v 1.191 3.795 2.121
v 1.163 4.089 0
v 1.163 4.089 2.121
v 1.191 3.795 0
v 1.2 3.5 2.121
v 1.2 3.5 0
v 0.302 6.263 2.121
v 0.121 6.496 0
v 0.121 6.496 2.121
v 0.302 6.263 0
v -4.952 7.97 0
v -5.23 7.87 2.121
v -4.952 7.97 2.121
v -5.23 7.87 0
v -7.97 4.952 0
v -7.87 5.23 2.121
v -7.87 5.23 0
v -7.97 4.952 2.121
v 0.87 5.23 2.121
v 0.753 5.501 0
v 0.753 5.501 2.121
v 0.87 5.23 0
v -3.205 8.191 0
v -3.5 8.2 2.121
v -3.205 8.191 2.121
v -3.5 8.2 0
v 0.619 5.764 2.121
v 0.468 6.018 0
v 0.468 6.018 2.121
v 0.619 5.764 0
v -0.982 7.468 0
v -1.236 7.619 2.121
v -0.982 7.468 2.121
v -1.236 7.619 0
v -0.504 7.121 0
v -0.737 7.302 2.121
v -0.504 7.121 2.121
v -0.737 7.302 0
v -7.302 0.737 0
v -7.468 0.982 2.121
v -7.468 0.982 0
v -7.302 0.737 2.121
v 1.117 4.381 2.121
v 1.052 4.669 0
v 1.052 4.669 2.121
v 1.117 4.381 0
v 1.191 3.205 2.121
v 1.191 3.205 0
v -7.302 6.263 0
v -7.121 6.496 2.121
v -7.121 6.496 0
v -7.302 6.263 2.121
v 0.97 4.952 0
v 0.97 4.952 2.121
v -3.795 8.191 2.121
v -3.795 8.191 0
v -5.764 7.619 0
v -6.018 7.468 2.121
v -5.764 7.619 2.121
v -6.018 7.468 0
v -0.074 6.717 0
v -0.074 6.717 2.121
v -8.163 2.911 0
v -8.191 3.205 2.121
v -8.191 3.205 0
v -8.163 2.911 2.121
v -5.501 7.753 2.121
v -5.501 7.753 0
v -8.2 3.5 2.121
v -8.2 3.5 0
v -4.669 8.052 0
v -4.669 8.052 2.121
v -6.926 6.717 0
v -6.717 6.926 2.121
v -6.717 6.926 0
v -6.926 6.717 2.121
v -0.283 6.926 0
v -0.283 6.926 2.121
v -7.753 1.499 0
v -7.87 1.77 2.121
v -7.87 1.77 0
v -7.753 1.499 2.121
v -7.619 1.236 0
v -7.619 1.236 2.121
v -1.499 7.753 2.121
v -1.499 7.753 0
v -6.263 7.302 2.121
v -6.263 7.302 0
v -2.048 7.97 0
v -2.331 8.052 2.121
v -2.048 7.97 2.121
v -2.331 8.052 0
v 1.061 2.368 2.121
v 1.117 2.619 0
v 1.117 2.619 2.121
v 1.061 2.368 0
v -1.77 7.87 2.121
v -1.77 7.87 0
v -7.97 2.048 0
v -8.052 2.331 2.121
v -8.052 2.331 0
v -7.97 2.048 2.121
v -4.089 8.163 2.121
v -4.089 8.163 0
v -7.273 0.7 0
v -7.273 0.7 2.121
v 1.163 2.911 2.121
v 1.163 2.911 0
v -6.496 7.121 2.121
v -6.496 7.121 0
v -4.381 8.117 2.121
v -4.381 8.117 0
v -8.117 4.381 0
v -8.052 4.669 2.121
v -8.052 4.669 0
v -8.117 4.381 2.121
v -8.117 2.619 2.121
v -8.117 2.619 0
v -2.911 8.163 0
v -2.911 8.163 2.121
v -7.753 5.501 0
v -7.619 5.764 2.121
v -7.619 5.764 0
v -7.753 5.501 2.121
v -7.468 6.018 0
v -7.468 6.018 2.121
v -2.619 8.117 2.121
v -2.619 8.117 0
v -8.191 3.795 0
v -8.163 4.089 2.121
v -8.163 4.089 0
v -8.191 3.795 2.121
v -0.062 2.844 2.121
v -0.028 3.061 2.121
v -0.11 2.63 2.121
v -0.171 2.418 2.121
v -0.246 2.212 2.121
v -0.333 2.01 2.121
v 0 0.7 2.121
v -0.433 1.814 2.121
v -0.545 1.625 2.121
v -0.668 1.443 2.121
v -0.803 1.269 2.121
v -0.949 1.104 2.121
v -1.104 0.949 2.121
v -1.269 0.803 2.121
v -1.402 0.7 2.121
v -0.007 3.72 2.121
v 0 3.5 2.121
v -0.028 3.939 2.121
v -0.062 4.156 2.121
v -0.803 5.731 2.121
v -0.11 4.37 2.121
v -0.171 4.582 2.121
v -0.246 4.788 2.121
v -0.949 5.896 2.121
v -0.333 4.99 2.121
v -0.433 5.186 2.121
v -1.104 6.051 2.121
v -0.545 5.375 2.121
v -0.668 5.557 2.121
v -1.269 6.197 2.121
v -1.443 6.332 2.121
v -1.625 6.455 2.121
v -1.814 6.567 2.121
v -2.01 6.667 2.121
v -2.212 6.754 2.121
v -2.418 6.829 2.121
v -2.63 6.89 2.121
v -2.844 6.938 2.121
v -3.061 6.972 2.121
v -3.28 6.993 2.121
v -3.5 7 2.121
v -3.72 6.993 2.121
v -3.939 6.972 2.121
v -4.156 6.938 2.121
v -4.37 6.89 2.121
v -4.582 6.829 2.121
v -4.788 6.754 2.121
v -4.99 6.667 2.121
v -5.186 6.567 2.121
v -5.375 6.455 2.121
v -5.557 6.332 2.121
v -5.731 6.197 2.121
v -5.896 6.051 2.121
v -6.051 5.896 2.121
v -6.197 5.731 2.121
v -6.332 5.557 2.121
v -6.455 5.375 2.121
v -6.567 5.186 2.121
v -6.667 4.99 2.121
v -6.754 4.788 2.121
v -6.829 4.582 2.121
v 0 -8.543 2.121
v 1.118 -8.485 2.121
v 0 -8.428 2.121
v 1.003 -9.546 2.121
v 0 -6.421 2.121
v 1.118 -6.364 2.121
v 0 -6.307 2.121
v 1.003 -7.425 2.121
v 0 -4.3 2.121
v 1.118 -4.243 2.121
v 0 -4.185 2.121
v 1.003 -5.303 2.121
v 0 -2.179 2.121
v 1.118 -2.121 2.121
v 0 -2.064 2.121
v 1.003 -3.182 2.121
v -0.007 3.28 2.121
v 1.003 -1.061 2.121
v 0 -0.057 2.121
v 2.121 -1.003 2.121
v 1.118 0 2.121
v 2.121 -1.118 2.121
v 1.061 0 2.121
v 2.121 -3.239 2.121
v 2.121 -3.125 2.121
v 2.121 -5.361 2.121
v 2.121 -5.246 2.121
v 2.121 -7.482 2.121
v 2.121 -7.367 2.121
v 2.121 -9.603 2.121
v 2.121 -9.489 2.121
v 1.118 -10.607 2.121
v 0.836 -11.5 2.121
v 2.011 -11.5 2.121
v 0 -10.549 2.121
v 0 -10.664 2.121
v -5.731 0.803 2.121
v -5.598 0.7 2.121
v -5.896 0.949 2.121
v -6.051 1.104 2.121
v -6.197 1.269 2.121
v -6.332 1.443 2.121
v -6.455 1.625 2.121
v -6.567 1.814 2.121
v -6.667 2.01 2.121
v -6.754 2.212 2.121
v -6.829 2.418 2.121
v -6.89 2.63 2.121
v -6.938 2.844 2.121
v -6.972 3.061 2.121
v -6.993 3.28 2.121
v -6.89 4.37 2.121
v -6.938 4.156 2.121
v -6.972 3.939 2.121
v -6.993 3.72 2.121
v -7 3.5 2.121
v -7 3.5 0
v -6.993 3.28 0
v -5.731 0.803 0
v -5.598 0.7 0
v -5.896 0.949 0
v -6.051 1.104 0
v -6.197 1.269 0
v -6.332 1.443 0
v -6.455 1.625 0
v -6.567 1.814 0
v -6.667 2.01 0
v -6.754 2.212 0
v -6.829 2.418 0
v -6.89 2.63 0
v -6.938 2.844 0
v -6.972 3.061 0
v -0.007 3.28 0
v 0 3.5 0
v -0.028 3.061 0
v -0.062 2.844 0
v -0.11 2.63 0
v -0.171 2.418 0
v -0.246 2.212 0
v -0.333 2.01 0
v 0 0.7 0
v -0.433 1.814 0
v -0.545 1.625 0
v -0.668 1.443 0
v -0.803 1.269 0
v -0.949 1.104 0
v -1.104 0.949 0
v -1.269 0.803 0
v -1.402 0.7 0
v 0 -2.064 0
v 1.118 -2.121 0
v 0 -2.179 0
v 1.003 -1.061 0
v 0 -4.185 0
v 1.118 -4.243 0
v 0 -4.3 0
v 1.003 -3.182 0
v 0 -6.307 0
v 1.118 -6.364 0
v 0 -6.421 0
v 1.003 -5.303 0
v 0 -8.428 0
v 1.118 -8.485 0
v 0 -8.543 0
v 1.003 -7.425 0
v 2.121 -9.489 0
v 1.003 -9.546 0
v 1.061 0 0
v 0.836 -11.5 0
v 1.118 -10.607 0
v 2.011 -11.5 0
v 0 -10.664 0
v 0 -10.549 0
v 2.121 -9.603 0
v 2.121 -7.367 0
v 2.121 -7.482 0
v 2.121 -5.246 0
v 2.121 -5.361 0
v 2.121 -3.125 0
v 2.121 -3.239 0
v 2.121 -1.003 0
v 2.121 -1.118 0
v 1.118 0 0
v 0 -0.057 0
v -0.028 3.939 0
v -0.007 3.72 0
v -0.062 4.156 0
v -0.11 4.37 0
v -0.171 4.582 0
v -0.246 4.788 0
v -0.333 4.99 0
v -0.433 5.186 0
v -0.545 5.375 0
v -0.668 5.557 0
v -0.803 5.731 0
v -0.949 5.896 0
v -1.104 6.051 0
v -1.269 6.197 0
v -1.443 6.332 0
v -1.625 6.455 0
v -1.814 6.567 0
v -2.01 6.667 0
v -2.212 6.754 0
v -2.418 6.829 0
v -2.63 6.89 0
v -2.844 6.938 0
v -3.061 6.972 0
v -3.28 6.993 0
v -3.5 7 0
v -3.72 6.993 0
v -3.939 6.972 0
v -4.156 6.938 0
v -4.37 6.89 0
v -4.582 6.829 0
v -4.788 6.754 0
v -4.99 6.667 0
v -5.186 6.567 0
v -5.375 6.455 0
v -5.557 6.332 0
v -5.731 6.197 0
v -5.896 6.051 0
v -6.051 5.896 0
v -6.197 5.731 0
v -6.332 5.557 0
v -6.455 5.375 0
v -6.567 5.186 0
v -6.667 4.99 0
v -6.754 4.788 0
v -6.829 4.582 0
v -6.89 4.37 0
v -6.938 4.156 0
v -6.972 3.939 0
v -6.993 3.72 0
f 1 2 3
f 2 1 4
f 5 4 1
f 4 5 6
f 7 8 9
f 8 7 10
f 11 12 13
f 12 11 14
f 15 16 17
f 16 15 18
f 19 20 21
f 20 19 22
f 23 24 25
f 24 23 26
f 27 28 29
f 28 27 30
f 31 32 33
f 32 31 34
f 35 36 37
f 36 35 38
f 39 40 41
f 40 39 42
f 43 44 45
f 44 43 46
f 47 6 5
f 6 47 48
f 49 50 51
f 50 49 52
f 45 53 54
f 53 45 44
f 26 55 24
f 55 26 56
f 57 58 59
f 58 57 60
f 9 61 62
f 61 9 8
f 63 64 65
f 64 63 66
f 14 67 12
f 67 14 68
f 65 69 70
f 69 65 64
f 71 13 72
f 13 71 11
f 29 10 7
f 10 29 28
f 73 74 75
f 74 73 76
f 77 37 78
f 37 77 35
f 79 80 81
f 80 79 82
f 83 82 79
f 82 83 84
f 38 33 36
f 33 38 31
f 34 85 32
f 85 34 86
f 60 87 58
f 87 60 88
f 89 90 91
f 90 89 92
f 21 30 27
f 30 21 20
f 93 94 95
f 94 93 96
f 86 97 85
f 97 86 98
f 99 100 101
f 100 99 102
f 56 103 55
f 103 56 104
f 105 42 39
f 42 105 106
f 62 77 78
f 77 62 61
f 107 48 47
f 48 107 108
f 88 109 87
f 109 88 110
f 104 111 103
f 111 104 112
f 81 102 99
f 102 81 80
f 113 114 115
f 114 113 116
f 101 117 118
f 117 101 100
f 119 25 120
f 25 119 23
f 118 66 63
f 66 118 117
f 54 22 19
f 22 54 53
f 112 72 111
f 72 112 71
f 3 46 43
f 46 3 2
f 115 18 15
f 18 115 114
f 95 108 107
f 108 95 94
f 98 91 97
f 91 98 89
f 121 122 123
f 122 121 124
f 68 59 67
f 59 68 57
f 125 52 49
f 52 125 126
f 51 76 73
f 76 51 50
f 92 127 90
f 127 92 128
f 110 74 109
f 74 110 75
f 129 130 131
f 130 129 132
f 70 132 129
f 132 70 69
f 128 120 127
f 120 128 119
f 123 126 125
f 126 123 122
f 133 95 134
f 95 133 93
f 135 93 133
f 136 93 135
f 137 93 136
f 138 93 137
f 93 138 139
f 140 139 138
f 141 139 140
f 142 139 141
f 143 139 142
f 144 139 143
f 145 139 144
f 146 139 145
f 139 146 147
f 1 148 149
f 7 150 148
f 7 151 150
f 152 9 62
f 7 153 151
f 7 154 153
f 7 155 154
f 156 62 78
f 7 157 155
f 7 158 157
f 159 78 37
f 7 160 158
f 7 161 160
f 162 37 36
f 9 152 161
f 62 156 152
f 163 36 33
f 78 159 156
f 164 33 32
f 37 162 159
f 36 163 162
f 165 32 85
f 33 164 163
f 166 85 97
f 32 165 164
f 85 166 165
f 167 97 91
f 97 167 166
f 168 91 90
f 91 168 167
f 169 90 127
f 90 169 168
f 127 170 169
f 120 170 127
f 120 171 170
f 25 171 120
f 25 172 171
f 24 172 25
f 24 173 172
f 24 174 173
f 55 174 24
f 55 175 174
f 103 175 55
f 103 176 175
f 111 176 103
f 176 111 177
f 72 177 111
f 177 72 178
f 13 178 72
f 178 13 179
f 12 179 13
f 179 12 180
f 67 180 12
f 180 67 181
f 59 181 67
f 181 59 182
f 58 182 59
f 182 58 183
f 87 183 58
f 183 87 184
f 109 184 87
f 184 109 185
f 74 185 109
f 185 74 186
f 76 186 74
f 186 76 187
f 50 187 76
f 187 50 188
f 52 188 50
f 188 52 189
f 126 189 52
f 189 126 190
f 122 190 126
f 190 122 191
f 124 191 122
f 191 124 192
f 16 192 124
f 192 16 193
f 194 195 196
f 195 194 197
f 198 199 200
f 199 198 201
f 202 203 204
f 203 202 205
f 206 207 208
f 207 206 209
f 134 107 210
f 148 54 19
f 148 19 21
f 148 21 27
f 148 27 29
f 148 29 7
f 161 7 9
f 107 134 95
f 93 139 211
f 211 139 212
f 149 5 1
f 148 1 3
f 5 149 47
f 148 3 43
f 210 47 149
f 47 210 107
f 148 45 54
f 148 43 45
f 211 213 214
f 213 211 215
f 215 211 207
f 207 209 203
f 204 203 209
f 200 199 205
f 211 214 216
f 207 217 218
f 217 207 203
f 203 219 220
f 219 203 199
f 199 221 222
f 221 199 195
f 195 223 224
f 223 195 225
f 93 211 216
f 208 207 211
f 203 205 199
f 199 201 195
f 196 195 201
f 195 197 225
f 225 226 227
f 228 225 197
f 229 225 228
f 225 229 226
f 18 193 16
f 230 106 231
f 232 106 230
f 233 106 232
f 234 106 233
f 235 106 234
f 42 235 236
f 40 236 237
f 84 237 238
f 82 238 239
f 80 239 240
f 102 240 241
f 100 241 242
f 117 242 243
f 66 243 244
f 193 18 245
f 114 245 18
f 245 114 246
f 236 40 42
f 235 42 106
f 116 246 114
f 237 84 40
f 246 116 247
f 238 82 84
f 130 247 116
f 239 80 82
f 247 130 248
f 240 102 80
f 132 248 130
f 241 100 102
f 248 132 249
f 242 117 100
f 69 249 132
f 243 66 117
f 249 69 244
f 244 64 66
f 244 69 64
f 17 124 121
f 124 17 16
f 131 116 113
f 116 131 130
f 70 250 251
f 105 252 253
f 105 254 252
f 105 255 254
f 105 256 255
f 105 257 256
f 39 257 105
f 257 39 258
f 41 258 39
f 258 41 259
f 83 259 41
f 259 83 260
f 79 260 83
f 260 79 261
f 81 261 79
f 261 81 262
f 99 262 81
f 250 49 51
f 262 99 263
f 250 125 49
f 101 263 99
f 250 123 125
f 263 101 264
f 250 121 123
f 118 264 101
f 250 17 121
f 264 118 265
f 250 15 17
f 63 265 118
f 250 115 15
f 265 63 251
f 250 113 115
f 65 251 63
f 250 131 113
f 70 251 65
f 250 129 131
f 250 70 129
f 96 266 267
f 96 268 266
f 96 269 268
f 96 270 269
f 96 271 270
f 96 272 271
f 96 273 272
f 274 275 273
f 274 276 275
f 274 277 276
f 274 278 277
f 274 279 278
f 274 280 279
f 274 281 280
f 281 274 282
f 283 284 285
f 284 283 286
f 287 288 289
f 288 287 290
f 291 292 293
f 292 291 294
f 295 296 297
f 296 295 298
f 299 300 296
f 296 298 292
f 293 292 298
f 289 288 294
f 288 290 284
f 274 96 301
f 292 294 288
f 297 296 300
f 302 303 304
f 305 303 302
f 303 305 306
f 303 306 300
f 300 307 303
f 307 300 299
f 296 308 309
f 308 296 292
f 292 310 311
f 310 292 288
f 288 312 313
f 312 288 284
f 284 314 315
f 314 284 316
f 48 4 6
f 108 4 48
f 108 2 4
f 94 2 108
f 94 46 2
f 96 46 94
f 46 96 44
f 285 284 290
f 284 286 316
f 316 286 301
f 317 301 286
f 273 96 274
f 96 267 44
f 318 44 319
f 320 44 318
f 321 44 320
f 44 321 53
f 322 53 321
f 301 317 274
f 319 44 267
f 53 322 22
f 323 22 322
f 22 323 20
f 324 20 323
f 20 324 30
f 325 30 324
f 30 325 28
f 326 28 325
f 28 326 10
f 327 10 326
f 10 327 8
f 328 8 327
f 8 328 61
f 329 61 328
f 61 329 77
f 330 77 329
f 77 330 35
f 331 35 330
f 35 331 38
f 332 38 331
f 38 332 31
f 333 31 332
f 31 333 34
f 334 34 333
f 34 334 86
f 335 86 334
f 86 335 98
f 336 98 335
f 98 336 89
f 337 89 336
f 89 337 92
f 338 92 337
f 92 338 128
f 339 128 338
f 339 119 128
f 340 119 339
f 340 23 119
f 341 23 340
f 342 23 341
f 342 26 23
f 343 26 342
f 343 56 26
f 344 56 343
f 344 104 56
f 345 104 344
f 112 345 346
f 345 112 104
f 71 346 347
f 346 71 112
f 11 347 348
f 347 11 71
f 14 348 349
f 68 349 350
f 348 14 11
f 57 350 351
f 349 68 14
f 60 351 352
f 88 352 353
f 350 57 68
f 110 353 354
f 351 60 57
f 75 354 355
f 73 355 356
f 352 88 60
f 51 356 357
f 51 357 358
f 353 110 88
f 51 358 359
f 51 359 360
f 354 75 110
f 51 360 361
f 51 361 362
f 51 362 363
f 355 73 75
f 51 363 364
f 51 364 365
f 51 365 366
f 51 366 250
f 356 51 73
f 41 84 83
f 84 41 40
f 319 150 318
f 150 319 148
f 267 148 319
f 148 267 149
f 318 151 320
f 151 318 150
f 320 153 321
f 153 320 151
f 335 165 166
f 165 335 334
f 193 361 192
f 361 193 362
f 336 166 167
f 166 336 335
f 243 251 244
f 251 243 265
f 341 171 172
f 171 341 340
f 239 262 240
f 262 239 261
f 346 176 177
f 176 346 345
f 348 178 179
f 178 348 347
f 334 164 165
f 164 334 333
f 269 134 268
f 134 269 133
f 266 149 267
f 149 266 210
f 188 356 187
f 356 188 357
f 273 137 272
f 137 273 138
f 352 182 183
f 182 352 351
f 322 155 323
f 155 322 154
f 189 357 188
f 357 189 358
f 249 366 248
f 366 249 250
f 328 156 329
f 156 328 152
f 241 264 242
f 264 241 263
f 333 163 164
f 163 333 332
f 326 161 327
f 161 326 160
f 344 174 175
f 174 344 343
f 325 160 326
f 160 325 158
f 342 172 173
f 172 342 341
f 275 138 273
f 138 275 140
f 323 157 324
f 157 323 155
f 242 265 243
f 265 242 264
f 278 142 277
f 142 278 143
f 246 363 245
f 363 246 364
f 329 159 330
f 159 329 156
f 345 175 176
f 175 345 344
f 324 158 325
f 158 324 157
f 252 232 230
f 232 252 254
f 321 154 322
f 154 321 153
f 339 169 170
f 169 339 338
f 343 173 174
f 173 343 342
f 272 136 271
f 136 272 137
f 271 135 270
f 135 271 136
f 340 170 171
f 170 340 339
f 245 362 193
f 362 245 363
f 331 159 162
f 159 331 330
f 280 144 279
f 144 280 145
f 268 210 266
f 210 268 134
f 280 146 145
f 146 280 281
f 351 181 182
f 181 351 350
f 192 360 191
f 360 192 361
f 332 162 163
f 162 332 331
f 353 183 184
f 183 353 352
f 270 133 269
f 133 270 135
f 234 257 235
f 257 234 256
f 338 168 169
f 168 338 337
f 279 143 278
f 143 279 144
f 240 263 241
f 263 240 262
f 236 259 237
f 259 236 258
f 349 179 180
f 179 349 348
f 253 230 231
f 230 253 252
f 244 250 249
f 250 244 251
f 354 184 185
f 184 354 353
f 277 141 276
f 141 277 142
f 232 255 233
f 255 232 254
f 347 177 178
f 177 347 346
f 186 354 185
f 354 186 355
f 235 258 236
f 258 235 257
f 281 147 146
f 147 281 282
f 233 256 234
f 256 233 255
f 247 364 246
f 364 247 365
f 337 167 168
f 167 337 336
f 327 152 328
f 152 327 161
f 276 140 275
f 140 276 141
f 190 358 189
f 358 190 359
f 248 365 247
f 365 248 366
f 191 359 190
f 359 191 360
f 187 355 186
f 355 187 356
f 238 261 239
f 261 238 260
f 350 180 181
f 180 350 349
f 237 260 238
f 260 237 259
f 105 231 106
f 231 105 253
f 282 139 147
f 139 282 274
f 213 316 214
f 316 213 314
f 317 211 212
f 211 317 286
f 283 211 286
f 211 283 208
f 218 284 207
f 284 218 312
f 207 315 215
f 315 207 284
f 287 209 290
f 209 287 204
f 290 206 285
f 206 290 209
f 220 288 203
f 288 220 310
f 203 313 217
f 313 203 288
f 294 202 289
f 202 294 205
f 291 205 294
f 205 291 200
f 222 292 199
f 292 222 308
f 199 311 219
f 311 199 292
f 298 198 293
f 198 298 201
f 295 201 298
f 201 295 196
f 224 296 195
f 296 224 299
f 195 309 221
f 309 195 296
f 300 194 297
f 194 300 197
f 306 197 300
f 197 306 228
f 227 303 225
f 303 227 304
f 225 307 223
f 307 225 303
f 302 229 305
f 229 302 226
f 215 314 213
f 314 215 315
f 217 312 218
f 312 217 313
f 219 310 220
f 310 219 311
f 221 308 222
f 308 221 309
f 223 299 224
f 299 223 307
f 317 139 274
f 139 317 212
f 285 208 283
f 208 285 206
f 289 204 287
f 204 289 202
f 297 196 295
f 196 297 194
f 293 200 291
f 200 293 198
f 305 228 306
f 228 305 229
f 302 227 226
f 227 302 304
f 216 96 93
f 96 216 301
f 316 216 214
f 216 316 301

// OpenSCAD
$fn = 100*1;

root = 7;
hole = 3;
deep = 15;

thick = sqrt(pow(hole/2,2)+pow(hole/2,2));


difference(){

translate([-root/2,root/2,0]){
    cylinder(r=root/2+1.2,h=thick);
}

translate([-root/2,root/2,-0.01]){
    cylinder(r=root/2,h=thick+02);
}

translate([-25,-50+root/10,-0.01]){
    cube([50,50,thick+0.02]);
}

}

difference(){

    translate([0,-deep+root/2,0]){
        cube([thick,deep,thick]);
    }

    for(i=[0:10]){
        translate([8/1.4 +thick/2,0-i*thick,thick/2]){
            rotate([0,0,45]){
                cube([8,8,thick+0.02],center=true);
            }
        }
        translate([-8/1.4+thick/2,-thick/2-i*thick,thick/2]){
            rotate([0,0,45]){
                cube([8,8,thick+0.02],center=true);
            }
        }
    }
    translate([thick/2,0,-0.01]){
        cube([8,8,thick+0.02]);
    }
}
